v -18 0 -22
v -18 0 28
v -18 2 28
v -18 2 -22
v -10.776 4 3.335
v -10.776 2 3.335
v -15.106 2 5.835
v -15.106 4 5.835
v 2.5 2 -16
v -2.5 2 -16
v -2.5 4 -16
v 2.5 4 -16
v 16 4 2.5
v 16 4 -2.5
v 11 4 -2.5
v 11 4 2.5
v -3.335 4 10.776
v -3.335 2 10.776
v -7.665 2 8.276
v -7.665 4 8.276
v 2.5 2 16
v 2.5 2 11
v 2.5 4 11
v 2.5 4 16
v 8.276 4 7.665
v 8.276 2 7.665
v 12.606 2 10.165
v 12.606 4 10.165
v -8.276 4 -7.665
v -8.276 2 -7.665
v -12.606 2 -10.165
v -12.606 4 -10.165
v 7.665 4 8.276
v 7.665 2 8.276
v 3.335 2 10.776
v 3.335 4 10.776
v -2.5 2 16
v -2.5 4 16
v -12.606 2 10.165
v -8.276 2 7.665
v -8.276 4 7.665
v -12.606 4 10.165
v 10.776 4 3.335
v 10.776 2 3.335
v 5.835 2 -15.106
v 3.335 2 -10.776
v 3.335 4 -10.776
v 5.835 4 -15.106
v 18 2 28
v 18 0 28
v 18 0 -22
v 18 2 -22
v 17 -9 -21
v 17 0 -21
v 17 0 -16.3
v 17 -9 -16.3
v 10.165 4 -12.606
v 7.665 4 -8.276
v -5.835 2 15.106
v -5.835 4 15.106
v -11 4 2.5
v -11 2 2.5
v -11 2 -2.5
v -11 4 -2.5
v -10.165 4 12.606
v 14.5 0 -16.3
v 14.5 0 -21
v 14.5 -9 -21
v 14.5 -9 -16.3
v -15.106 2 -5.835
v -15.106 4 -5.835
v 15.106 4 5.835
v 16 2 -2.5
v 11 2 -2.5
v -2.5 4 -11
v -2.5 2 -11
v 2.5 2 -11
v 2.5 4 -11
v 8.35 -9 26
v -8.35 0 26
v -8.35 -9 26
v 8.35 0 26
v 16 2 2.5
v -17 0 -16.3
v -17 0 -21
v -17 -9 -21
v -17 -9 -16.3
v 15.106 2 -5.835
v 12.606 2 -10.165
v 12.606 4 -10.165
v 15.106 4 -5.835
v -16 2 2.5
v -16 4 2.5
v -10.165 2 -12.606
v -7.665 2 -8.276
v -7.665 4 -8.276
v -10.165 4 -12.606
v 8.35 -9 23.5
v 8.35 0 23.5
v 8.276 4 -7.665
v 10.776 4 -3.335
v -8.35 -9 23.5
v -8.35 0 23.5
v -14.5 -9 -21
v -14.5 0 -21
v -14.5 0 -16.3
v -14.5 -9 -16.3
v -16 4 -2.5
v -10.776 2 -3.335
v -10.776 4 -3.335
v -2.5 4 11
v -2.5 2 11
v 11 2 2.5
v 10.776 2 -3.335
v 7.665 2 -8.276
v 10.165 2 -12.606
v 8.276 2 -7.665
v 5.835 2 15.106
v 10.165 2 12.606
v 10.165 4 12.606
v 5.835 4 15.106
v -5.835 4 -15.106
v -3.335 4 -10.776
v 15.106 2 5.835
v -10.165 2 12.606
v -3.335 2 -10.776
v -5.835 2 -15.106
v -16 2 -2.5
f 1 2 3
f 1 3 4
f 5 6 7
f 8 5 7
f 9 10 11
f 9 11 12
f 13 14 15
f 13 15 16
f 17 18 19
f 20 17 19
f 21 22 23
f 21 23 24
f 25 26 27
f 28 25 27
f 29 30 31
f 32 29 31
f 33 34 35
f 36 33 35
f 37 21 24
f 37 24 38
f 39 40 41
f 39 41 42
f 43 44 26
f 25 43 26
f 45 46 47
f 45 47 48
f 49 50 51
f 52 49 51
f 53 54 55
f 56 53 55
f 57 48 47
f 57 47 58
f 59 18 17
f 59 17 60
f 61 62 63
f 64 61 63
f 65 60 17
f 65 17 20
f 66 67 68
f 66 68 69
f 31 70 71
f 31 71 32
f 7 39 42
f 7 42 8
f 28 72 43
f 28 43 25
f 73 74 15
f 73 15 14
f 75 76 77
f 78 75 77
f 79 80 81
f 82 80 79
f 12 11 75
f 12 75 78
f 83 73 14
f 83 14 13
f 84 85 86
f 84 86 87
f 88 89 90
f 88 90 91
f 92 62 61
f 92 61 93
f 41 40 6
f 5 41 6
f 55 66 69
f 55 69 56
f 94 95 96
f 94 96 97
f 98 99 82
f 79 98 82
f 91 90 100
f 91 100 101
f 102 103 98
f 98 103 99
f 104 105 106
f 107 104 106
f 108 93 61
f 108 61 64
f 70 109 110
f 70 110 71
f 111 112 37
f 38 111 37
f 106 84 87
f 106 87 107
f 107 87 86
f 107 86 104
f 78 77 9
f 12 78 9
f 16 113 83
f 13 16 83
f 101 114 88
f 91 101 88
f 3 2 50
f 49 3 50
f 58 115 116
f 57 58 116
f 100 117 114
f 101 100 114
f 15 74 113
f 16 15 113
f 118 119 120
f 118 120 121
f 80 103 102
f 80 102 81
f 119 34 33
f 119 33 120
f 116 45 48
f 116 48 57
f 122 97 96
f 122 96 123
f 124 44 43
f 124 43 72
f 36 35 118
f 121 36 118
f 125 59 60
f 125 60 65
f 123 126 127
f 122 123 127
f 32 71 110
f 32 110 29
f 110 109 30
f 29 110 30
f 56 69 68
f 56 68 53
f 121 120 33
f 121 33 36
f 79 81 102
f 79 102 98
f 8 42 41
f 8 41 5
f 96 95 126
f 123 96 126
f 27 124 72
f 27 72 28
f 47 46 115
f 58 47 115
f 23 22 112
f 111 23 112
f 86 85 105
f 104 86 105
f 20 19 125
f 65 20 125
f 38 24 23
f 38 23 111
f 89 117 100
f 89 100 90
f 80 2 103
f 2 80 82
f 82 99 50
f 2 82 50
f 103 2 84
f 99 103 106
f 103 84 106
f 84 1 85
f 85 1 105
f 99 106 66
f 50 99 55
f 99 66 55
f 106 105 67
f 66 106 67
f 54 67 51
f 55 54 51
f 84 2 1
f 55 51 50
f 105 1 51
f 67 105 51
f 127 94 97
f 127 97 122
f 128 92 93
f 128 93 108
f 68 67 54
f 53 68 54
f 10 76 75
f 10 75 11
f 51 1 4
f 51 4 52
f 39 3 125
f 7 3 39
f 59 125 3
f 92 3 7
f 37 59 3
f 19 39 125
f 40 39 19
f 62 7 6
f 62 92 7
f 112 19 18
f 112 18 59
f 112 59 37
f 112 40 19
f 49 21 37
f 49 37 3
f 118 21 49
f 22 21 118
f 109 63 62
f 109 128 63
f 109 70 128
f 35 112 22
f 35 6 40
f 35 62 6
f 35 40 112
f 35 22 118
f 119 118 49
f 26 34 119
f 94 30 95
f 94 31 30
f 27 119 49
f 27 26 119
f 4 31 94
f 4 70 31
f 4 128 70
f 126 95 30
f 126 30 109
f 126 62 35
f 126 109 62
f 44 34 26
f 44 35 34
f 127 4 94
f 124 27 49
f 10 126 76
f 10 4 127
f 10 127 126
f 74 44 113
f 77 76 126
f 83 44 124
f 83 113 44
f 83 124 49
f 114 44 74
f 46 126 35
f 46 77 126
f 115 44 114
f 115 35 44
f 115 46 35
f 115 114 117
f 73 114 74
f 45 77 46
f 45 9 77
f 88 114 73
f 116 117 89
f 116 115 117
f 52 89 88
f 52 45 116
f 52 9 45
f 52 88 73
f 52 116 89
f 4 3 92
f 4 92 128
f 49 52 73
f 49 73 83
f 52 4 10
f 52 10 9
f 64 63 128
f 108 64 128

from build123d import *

# Parameters (mm, degrees)
SKETCH1_W           = 36
SKETCH1_H           = 50
BOSS_EXTRUDE1_DEPTH = 2
SKETCH2_W           = 5
SKETCH2_H           = 5
BOSS_EXTRUDE2_DEPTH = 2
CIRPATTERN1_COUNT   = 12
SKETCH3_W           = 16.7
SKETCH3_H           = 2.5
SKETCH3_W_2         = 2.5
SKETCH3_H_2         = 4.7
BOSS_EXTRUDE3_DEPTH = 9


with BuildPart() as part:
    # Sketch1 → Boss-Extrude1 (new body)
    with BuildSketch(Plane(origin=(0, 0, 0), x_dir=(1, 0, 0), z_dir=(0, 1, 0))):
        with Locations((0, -3)):
            Rectangle(SKETCH1_W, SKETCH1_H)
    extrude(amount=BOSS_EXTRUDE1_DEPTH)

    # Sketch2 → Boss-Extrude2 (add)
    with BuildSketch(Plane(origin=(0, 2, 0), x_dir=(1, 0, 0), z_dir=(0, 1, 0))):
        with Locations((0, 13.5)):
            Rectangle(SKETCH2_W, SKETCH2_H)
    boss_extrude2 = extrude(amount=BOSS_EXTRUDE2_DEPTH)

    # CirPattern1: Boss-Extrude2 ×12 about axis
    cirpattern1_axis = Axis((0, 0, 0), (0, 1, 0))
    for i in range(1, CIRPATTERN1_COUNT):
        add(boss_extrude2.rotate(cirpattern1_axis, i * 360 / CIRPATTERN1_COUNT))

    # Sketch3 → Boss-Extrude3 (add)
    with BuildSketch(Plane.XZ):
        with Locations((0, 24.75)):
            Rectangle(SKETCH3_W, SKETCH3_H)
        with Locations((-15.75, -18.65)):
            Rectangle(SKETCH3_W_2, SKETCH3_H_2)
        with Locations((15.75, -18.65)):
            Rectangle(SKETCH3_W_2, SKETCH3_H_2)
    extrude(amount=BOSS_EXTRUDE3_DEPTH)


solid = part.part
